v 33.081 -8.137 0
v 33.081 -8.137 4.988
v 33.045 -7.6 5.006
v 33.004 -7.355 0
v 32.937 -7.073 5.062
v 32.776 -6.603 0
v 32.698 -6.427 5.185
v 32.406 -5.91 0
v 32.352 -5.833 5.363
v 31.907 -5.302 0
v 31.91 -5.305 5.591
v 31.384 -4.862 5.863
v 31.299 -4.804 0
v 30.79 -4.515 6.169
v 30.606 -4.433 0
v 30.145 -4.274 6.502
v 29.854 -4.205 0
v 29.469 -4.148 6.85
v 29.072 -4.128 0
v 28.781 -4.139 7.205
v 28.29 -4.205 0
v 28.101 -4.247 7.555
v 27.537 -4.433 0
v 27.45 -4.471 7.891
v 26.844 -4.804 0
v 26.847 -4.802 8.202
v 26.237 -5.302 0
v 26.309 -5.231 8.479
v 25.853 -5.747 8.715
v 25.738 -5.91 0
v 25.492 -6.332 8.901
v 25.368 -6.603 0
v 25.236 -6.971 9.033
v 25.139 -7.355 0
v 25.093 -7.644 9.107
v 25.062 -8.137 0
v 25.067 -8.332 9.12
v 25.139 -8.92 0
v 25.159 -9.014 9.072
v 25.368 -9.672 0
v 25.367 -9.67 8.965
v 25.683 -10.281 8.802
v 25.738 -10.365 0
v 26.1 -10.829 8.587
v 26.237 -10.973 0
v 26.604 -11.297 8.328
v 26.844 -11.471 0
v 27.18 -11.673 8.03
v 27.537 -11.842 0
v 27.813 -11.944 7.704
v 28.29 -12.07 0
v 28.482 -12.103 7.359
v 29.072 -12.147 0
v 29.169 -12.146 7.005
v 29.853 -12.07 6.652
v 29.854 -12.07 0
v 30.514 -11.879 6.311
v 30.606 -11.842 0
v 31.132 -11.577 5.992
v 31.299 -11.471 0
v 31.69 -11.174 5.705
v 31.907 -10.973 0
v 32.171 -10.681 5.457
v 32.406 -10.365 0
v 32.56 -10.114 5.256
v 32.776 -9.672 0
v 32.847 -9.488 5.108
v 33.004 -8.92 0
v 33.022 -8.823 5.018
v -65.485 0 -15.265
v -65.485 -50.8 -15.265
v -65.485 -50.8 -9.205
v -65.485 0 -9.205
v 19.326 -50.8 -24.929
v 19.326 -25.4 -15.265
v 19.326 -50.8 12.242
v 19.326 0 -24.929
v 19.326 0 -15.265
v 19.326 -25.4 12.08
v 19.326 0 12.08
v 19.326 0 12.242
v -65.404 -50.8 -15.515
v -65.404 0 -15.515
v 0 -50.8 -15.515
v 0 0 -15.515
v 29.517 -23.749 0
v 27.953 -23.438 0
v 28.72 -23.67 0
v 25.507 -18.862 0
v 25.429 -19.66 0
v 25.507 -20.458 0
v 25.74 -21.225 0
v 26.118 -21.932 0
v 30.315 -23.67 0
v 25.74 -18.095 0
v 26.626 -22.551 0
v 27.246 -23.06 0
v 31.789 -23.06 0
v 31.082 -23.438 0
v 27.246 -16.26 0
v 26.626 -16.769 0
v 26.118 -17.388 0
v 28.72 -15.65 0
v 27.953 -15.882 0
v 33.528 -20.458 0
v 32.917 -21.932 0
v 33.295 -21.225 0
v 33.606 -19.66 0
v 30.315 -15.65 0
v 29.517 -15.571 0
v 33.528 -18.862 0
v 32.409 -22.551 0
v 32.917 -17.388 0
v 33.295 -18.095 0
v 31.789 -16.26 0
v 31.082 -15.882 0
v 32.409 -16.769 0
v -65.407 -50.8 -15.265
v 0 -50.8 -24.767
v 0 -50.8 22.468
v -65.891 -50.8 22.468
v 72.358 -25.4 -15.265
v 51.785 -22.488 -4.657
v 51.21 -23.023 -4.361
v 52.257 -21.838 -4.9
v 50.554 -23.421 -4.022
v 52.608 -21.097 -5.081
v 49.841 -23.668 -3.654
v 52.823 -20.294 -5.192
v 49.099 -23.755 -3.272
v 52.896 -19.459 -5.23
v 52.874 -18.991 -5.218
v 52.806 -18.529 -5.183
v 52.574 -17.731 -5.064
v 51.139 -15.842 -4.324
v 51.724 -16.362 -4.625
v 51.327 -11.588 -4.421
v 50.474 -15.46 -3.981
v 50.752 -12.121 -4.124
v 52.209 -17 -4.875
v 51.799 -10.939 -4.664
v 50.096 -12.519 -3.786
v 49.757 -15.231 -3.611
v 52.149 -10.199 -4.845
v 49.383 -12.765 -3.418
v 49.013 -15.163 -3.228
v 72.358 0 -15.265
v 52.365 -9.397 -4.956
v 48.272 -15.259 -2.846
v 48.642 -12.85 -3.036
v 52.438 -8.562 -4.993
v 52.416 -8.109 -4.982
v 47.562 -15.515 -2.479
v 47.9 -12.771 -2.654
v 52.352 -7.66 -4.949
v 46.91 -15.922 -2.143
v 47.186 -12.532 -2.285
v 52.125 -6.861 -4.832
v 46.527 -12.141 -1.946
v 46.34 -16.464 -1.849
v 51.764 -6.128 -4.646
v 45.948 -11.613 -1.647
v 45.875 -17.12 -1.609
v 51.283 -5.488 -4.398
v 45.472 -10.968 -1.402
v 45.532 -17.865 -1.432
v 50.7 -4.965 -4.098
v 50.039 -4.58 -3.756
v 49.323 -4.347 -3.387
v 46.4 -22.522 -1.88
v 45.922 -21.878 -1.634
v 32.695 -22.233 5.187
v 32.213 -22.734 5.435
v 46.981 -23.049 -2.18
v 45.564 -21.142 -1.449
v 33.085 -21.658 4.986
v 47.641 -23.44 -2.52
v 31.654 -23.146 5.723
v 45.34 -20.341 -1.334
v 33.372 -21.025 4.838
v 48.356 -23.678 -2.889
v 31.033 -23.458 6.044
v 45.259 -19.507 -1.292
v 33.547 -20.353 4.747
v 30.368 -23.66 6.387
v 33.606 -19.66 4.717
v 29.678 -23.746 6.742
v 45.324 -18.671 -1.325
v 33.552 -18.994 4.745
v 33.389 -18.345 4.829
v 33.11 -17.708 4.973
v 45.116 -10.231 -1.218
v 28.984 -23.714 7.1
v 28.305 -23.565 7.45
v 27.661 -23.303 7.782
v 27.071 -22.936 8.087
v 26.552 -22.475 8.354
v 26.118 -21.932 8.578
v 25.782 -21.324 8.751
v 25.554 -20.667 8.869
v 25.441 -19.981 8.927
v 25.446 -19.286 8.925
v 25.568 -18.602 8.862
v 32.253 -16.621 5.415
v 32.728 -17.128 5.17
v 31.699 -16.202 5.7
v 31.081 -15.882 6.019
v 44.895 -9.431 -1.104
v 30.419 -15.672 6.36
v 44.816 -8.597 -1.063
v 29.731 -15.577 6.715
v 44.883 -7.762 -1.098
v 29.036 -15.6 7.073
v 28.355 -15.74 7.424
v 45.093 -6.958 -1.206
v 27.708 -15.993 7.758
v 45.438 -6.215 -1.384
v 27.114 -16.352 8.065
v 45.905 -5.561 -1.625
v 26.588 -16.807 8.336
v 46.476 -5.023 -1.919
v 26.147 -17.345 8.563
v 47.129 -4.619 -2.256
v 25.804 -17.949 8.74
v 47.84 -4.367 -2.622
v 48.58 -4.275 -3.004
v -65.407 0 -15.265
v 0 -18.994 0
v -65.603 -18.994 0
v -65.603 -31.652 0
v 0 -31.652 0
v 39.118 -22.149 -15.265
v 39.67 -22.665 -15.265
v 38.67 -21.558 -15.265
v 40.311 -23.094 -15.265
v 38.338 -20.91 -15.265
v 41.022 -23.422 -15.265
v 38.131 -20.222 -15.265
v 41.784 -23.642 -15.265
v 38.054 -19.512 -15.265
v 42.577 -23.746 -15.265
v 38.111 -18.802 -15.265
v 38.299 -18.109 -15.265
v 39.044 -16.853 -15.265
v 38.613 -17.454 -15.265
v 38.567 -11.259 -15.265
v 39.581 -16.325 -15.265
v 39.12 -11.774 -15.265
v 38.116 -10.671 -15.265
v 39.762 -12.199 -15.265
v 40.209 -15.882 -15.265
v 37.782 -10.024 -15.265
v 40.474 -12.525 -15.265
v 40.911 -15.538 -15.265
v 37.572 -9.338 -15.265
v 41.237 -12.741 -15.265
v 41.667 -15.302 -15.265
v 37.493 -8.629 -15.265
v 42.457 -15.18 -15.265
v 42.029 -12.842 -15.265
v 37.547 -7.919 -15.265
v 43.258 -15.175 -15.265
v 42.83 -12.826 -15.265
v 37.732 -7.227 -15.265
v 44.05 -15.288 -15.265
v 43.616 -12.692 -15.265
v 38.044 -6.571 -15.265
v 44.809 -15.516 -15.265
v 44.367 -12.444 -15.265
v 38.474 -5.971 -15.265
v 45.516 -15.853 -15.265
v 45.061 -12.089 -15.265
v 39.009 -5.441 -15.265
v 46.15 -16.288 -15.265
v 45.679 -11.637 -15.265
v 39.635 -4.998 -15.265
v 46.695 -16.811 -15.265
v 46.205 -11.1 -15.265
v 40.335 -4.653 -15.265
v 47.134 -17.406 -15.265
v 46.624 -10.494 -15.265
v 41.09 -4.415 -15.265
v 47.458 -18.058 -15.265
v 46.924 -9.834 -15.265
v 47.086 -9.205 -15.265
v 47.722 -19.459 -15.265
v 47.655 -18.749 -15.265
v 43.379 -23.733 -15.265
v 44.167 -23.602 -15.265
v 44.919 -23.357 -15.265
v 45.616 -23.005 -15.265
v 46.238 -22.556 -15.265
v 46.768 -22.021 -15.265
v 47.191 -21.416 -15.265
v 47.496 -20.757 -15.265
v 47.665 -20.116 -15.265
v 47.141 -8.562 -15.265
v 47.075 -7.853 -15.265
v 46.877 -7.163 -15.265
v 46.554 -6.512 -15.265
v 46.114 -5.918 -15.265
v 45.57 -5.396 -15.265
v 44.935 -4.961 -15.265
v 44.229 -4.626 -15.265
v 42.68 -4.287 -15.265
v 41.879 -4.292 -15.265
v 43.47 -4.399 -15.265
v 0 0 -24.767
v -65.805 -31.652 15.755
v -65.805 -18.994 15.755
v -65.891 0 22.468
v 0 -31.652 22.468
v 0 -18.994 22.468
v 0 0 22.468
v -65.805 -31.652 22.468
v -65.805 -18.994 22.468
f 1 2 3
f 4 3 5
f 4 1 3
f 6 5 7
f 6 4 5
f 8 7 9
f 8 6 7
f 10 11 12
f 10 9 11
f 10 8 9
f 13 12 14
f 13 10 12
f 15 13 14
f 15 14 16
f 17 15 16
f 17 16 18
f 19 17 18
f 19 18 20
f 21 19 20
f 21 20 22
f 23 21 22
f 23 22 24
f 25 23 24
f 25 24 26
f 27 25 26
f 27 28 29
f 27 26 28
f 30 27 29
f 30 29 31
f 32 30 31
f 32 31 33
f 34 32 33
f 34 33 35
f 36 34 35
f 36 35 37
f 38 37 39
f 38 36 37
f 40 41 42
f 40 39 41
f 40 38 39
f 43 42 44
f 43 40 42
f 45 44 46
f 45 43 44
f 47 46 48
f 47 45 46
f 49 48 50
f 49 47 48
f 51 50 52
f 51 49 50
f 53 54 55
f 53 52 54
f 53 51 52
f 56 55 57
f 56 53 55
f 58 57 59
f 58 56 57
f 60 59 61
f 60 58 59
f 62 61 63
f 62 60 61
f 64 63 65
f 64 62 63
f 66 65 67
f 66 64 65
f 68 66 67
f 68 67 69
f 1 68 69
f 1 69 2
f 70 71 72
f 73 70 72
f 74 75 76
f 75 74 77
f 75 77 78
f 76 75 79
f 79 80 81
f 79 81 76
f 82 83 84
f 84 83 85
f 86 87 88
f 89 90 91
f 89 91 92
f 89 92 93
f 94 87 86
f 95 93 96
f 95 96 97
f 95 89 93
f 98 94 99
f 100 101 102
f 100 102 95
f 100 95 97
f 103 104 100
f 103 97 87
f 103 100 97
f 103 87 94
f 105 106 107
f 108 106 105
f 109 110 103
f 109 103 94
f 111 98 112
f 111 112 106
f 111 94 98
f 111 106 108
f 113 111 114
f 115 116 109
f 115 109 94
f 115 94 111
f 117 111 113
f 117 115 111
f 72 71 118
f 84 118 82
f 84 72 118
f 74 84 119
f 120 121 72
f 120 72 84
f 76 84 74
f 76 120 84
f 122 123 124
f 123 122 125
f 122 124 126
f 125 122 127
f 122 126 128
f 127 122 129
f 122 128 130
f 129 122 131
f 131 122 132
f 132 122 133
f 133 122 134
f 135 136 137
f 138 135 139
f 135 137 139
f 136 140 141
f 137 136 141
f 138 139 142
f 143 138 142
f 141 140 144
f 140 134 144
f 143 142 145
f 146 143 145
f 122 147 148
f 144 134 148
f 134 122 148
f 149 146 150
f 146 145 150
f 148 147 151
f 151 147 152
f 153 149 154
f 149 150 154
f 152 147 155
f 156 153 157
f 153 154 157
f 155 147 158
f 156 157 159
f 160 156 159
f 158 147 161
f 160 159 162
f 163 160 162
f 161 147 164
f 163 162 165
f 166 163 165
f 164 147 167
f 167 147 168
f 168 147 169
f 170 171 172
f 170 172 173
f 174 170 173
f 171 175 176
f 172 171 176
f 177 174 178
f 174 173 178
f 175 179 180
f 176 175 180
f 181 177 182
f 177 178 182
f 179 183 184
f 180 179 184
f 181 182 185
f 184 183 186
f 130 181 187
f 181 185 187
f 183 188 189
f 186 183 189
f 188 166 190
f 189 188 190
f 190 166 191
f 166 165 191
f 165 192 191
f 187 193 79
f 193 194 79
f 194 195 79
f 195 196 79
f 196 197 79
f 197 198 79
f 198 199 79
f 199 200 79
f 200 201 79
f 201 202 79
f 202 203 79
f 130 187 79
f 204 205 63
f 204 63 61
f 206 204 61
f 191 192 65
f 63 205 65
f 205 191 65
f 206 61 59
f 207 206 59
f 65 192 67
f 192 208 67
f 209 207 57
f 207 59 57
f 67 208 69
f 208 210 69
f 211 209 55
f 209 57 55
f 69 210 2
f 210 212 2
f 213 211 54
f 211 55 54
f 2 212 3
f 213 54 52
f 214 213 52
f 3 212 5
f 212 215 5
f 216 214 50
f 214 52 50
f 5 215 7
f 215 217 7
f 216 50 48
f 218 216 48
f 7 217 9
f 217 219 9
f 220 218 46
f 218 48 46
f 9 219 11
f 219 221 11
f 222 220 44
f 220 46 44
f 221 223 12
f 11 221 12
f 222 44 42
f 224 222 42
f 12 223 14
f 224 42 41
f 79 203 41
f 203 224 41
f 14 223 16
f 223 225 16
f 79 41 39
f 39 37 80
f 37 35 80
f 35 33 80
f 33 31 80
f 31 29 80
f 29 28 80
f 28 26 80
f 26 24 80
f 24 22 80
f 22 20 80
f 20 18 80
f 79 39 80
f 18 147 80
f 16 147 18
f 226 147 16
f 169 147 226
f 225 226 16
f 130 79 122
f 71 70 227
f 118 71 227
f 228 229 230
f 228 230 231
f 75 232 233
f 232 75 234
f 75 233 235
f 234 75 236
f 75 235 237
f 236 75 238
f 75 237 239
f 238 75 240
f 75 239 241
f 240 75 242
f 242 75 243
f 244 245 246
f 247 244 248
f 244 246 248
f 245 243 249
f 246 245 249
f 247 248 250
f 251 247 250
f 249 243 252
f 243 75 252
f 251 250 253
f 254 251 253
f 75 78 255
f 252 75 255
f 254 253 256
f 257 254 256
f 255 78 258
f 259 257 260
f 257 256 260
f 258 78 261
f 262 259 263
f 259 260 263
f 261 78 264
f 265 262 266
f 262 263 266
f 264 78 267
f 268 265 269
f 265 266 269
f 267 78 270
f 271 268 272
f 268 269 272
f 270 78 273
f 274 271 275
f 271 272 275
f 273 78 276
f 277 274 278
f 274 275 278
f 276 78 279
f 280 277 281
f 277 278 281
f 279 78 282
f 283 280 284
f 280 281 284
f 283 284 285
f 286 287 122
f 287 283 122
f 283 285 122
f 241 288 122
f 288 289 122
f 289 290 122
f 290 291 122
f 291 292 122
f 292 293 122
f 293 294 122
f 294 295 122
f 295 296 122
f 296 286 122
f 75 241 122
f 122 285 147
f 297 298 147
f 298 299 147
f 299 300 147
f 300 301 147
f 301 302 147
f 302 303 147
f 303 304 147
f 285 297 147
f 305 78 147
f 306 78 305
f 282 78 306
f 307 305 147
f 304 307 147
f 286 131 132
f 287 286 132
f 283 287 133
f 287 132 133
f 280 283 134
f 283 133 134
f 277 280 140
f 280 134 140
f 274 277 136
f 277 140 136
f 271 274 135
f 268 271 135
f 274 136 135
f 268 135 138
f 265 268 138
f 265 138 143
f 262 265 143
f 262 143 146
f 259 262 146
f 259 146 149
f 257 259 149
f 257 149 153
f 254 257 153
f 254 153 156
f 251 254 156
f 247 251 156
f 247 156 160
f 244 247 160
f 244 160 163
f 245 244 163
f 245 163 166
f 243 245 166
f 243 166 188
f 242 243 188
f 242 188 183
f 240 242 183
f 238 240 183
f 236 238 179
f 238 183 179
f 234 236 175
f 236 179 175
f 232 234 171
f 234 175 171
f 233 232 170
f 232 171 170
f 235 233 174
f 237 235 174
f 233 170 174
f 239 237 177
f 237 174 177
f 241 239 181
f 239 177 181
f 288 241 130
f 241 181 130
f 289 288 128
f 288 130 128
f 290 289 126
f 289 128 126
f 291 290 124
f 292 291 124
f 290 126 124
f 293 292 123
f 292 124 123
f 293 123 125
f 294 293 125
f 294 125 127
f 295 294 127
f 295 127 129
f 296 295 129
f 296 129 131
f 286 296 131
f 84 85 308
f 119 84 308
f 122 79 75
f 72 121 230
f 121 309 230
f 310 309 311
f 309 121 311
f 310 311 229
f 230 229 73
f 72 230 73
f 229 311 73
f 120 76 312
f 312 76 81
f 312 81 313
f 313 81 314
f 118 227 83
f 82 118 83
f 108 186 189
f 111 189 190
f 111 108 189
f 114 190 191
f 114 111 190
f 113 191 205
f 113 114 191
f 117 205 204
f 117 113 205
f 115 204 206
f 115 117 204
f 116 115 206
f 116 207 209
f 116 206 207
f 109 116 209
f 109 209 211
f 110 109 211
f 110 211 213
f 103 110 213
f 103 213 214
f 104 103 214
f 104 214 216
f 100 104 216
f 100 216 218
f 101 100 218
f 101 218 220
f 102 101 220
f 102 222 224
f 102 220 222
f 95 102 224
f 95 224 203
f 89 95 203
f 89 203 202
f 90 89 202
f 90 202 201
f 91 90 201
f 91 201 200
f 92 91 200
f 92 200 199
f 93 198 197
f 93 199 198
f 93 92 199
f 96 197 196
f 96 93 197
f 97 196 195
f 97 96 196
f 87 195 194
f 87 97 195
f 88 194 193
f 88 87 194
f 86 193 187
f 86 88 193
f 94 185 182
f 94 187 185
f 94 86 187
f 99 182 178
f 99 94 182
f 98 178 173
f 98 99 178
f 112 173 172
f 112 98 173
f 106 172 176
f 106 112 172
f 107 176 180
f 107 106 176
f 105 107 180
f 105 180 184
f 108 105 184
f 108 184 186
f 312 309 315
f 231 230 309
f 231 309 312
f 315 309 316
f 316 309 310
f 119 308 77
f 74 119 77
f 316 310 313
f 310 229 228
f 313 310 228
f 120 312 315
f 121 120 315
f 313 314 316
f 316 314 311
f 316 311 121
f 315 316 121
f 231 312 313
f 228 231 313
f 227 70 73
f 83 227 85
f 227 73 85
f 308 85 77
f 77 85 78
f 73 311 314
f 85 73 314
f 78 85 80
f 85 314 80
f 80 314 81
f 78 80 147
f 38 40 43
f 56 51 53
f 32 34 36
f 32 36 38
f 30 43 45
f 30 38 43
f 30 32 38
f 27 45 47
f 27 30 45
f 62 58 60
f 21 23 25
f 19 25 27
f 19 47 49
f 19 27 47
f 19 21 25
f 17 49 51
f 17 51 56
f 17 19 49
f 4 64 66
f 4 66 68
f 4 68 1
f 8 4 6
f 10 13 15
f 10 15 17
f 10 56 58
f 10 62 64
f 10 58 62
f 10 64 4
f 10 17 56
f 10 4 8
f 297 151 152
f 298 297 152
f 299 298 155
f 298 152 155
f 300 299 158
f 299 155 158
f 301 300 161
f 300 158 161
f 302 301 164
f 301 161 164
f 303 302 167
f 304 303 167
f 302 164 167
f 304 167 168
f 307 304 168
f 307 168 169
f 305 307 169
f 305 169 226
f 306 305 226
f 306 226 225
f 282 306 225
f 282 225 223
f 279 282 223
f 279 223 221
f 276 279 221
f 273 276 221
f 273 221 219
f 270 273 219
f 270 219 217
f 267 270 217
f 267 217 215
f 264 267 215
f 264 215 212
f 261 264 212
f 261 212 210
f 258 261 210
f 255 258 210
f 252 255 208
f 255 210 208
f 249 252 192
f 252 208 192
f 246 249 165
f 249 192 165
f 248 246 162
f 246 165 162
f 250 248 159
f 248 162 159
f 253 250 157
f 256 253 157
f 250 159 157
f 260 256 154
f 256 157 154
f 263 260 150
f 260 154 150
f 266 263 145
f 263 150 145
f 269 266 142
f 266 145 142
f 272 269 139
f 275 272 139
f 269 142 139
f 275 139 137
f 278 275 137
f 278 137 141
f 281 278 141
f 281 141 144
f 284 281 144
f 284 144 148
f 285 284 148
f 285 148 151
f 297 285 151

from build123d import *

# Parameters (mm, degrees)
F0_W      = 65.485179
F0_H      = 37.281514
F1_DEPTH  = 50.8
F2_DEPTH  = 25.4
F4_DEPTH  = 50.8
F5_DEPTH  = 25.4
F6_W      = 65.805174
F6_H      = 12.657734
F7_DEPTH  = 38.1
F8_R      = 4.088861
F8_R_2    = 4.00946
F8_R_3    = 3.015148
F8_R_4    = 3.207559
F9_DEPTH  = 50.8
F10_R     = 4.296348
F10_R_2   = 4.287756
F11_DEPTH = 25.4


with BuildPart() as f1:
    # F0 (on Front) → F1 (new body)
    with BuildSketch(Plane.XZ):
        with Locations((-32.74259, 3.37556)):
            Rectangle(F0_W, F0_H)
        Polygon((19.307569, 12.089744), (0, 22.016317), (0, -15.265197), (0, -24.720937), (19.307569, -24.720937), (19.307569, -15.265197), align=None)
    extrude(amount=F1_DEPTH)

    # F0 (on Front) → F2 (join)
    with BuildSketch(Plane.XZ):
        Polygon((72.358251, -15.265197), (19.307569, 12.089744), (19.307569, -15.265197), (64.418688, -15.265197), align=None)
    extrude(amount=F2_DEPTH)

    # F3 (on Front) → F4 (join)
    with BuildSketch(Plane.XZ):
        Polygon((0, 22.467867), (-65.891236, 22.467867), (-65.404281, -15.514851), (0, -15.514851), align=None)
        Polygon((19.326396, 12.241751), (0, 22.467867), (0, -15.514851), (0, -24.767056), (19.326396, -24.929374), (19.326396, -15.677169), align=None)
    extrude(amount=F4_DEPTH)

    # F0 (on Front) → F5 (join)
    with BuildSketch(Plane.XZ):
        Polygon((72.358251, -15.265197), (19.307569, 12.089744), (19.307569, -15.265197), (64.418688, -15.265197), align=None)
    extrude(amount=F5_DEPTH)

    # F6 (on Top) → F7 (cut)
    with BuildSketch(Plane.XY):
        with Locations((-32.902587, -25.323051)):
            Rectangle(F6_W, F6_H)
    extrude(amount=F7_DEPTH, mode=Mode.SUBTRACT)

    # F8 (on Top) → F9 (cut)
    with BuildSketch(Plane.XY):
        with Locations((29.517371, -19.660087)):
            Circle(F8_R)
        with Locations((29.071776, -8.137451)):
            Circle(F8_R_2)
        with Locations((55.278175, -19.761529)):
            Circle(F8_R_3)
        with Locations((54.863308, -8.436291)):
            Circle(F8_R_4)
    extrude(amount=F9_DEPTH, mode=Mode.SUBTRACT)

    # F10 (on face) → F11 (cut)
    with BuildSketch(Plane(origin=(8.979881, 0, 17.415091), x_dir=(0.888799, 0, -0.458298), z_dir=(0.458298, 0, 0.888799))):
        with Locations((45.114581, -19.458767)):
            Circle(F10_R)
        with Locations((44.607103, -8.562293)):
            Circle(F10_R_2)
    extrude(amount=-F11_DEPTH, mode=Mode.SUBTRACT)


solid = f1.part
